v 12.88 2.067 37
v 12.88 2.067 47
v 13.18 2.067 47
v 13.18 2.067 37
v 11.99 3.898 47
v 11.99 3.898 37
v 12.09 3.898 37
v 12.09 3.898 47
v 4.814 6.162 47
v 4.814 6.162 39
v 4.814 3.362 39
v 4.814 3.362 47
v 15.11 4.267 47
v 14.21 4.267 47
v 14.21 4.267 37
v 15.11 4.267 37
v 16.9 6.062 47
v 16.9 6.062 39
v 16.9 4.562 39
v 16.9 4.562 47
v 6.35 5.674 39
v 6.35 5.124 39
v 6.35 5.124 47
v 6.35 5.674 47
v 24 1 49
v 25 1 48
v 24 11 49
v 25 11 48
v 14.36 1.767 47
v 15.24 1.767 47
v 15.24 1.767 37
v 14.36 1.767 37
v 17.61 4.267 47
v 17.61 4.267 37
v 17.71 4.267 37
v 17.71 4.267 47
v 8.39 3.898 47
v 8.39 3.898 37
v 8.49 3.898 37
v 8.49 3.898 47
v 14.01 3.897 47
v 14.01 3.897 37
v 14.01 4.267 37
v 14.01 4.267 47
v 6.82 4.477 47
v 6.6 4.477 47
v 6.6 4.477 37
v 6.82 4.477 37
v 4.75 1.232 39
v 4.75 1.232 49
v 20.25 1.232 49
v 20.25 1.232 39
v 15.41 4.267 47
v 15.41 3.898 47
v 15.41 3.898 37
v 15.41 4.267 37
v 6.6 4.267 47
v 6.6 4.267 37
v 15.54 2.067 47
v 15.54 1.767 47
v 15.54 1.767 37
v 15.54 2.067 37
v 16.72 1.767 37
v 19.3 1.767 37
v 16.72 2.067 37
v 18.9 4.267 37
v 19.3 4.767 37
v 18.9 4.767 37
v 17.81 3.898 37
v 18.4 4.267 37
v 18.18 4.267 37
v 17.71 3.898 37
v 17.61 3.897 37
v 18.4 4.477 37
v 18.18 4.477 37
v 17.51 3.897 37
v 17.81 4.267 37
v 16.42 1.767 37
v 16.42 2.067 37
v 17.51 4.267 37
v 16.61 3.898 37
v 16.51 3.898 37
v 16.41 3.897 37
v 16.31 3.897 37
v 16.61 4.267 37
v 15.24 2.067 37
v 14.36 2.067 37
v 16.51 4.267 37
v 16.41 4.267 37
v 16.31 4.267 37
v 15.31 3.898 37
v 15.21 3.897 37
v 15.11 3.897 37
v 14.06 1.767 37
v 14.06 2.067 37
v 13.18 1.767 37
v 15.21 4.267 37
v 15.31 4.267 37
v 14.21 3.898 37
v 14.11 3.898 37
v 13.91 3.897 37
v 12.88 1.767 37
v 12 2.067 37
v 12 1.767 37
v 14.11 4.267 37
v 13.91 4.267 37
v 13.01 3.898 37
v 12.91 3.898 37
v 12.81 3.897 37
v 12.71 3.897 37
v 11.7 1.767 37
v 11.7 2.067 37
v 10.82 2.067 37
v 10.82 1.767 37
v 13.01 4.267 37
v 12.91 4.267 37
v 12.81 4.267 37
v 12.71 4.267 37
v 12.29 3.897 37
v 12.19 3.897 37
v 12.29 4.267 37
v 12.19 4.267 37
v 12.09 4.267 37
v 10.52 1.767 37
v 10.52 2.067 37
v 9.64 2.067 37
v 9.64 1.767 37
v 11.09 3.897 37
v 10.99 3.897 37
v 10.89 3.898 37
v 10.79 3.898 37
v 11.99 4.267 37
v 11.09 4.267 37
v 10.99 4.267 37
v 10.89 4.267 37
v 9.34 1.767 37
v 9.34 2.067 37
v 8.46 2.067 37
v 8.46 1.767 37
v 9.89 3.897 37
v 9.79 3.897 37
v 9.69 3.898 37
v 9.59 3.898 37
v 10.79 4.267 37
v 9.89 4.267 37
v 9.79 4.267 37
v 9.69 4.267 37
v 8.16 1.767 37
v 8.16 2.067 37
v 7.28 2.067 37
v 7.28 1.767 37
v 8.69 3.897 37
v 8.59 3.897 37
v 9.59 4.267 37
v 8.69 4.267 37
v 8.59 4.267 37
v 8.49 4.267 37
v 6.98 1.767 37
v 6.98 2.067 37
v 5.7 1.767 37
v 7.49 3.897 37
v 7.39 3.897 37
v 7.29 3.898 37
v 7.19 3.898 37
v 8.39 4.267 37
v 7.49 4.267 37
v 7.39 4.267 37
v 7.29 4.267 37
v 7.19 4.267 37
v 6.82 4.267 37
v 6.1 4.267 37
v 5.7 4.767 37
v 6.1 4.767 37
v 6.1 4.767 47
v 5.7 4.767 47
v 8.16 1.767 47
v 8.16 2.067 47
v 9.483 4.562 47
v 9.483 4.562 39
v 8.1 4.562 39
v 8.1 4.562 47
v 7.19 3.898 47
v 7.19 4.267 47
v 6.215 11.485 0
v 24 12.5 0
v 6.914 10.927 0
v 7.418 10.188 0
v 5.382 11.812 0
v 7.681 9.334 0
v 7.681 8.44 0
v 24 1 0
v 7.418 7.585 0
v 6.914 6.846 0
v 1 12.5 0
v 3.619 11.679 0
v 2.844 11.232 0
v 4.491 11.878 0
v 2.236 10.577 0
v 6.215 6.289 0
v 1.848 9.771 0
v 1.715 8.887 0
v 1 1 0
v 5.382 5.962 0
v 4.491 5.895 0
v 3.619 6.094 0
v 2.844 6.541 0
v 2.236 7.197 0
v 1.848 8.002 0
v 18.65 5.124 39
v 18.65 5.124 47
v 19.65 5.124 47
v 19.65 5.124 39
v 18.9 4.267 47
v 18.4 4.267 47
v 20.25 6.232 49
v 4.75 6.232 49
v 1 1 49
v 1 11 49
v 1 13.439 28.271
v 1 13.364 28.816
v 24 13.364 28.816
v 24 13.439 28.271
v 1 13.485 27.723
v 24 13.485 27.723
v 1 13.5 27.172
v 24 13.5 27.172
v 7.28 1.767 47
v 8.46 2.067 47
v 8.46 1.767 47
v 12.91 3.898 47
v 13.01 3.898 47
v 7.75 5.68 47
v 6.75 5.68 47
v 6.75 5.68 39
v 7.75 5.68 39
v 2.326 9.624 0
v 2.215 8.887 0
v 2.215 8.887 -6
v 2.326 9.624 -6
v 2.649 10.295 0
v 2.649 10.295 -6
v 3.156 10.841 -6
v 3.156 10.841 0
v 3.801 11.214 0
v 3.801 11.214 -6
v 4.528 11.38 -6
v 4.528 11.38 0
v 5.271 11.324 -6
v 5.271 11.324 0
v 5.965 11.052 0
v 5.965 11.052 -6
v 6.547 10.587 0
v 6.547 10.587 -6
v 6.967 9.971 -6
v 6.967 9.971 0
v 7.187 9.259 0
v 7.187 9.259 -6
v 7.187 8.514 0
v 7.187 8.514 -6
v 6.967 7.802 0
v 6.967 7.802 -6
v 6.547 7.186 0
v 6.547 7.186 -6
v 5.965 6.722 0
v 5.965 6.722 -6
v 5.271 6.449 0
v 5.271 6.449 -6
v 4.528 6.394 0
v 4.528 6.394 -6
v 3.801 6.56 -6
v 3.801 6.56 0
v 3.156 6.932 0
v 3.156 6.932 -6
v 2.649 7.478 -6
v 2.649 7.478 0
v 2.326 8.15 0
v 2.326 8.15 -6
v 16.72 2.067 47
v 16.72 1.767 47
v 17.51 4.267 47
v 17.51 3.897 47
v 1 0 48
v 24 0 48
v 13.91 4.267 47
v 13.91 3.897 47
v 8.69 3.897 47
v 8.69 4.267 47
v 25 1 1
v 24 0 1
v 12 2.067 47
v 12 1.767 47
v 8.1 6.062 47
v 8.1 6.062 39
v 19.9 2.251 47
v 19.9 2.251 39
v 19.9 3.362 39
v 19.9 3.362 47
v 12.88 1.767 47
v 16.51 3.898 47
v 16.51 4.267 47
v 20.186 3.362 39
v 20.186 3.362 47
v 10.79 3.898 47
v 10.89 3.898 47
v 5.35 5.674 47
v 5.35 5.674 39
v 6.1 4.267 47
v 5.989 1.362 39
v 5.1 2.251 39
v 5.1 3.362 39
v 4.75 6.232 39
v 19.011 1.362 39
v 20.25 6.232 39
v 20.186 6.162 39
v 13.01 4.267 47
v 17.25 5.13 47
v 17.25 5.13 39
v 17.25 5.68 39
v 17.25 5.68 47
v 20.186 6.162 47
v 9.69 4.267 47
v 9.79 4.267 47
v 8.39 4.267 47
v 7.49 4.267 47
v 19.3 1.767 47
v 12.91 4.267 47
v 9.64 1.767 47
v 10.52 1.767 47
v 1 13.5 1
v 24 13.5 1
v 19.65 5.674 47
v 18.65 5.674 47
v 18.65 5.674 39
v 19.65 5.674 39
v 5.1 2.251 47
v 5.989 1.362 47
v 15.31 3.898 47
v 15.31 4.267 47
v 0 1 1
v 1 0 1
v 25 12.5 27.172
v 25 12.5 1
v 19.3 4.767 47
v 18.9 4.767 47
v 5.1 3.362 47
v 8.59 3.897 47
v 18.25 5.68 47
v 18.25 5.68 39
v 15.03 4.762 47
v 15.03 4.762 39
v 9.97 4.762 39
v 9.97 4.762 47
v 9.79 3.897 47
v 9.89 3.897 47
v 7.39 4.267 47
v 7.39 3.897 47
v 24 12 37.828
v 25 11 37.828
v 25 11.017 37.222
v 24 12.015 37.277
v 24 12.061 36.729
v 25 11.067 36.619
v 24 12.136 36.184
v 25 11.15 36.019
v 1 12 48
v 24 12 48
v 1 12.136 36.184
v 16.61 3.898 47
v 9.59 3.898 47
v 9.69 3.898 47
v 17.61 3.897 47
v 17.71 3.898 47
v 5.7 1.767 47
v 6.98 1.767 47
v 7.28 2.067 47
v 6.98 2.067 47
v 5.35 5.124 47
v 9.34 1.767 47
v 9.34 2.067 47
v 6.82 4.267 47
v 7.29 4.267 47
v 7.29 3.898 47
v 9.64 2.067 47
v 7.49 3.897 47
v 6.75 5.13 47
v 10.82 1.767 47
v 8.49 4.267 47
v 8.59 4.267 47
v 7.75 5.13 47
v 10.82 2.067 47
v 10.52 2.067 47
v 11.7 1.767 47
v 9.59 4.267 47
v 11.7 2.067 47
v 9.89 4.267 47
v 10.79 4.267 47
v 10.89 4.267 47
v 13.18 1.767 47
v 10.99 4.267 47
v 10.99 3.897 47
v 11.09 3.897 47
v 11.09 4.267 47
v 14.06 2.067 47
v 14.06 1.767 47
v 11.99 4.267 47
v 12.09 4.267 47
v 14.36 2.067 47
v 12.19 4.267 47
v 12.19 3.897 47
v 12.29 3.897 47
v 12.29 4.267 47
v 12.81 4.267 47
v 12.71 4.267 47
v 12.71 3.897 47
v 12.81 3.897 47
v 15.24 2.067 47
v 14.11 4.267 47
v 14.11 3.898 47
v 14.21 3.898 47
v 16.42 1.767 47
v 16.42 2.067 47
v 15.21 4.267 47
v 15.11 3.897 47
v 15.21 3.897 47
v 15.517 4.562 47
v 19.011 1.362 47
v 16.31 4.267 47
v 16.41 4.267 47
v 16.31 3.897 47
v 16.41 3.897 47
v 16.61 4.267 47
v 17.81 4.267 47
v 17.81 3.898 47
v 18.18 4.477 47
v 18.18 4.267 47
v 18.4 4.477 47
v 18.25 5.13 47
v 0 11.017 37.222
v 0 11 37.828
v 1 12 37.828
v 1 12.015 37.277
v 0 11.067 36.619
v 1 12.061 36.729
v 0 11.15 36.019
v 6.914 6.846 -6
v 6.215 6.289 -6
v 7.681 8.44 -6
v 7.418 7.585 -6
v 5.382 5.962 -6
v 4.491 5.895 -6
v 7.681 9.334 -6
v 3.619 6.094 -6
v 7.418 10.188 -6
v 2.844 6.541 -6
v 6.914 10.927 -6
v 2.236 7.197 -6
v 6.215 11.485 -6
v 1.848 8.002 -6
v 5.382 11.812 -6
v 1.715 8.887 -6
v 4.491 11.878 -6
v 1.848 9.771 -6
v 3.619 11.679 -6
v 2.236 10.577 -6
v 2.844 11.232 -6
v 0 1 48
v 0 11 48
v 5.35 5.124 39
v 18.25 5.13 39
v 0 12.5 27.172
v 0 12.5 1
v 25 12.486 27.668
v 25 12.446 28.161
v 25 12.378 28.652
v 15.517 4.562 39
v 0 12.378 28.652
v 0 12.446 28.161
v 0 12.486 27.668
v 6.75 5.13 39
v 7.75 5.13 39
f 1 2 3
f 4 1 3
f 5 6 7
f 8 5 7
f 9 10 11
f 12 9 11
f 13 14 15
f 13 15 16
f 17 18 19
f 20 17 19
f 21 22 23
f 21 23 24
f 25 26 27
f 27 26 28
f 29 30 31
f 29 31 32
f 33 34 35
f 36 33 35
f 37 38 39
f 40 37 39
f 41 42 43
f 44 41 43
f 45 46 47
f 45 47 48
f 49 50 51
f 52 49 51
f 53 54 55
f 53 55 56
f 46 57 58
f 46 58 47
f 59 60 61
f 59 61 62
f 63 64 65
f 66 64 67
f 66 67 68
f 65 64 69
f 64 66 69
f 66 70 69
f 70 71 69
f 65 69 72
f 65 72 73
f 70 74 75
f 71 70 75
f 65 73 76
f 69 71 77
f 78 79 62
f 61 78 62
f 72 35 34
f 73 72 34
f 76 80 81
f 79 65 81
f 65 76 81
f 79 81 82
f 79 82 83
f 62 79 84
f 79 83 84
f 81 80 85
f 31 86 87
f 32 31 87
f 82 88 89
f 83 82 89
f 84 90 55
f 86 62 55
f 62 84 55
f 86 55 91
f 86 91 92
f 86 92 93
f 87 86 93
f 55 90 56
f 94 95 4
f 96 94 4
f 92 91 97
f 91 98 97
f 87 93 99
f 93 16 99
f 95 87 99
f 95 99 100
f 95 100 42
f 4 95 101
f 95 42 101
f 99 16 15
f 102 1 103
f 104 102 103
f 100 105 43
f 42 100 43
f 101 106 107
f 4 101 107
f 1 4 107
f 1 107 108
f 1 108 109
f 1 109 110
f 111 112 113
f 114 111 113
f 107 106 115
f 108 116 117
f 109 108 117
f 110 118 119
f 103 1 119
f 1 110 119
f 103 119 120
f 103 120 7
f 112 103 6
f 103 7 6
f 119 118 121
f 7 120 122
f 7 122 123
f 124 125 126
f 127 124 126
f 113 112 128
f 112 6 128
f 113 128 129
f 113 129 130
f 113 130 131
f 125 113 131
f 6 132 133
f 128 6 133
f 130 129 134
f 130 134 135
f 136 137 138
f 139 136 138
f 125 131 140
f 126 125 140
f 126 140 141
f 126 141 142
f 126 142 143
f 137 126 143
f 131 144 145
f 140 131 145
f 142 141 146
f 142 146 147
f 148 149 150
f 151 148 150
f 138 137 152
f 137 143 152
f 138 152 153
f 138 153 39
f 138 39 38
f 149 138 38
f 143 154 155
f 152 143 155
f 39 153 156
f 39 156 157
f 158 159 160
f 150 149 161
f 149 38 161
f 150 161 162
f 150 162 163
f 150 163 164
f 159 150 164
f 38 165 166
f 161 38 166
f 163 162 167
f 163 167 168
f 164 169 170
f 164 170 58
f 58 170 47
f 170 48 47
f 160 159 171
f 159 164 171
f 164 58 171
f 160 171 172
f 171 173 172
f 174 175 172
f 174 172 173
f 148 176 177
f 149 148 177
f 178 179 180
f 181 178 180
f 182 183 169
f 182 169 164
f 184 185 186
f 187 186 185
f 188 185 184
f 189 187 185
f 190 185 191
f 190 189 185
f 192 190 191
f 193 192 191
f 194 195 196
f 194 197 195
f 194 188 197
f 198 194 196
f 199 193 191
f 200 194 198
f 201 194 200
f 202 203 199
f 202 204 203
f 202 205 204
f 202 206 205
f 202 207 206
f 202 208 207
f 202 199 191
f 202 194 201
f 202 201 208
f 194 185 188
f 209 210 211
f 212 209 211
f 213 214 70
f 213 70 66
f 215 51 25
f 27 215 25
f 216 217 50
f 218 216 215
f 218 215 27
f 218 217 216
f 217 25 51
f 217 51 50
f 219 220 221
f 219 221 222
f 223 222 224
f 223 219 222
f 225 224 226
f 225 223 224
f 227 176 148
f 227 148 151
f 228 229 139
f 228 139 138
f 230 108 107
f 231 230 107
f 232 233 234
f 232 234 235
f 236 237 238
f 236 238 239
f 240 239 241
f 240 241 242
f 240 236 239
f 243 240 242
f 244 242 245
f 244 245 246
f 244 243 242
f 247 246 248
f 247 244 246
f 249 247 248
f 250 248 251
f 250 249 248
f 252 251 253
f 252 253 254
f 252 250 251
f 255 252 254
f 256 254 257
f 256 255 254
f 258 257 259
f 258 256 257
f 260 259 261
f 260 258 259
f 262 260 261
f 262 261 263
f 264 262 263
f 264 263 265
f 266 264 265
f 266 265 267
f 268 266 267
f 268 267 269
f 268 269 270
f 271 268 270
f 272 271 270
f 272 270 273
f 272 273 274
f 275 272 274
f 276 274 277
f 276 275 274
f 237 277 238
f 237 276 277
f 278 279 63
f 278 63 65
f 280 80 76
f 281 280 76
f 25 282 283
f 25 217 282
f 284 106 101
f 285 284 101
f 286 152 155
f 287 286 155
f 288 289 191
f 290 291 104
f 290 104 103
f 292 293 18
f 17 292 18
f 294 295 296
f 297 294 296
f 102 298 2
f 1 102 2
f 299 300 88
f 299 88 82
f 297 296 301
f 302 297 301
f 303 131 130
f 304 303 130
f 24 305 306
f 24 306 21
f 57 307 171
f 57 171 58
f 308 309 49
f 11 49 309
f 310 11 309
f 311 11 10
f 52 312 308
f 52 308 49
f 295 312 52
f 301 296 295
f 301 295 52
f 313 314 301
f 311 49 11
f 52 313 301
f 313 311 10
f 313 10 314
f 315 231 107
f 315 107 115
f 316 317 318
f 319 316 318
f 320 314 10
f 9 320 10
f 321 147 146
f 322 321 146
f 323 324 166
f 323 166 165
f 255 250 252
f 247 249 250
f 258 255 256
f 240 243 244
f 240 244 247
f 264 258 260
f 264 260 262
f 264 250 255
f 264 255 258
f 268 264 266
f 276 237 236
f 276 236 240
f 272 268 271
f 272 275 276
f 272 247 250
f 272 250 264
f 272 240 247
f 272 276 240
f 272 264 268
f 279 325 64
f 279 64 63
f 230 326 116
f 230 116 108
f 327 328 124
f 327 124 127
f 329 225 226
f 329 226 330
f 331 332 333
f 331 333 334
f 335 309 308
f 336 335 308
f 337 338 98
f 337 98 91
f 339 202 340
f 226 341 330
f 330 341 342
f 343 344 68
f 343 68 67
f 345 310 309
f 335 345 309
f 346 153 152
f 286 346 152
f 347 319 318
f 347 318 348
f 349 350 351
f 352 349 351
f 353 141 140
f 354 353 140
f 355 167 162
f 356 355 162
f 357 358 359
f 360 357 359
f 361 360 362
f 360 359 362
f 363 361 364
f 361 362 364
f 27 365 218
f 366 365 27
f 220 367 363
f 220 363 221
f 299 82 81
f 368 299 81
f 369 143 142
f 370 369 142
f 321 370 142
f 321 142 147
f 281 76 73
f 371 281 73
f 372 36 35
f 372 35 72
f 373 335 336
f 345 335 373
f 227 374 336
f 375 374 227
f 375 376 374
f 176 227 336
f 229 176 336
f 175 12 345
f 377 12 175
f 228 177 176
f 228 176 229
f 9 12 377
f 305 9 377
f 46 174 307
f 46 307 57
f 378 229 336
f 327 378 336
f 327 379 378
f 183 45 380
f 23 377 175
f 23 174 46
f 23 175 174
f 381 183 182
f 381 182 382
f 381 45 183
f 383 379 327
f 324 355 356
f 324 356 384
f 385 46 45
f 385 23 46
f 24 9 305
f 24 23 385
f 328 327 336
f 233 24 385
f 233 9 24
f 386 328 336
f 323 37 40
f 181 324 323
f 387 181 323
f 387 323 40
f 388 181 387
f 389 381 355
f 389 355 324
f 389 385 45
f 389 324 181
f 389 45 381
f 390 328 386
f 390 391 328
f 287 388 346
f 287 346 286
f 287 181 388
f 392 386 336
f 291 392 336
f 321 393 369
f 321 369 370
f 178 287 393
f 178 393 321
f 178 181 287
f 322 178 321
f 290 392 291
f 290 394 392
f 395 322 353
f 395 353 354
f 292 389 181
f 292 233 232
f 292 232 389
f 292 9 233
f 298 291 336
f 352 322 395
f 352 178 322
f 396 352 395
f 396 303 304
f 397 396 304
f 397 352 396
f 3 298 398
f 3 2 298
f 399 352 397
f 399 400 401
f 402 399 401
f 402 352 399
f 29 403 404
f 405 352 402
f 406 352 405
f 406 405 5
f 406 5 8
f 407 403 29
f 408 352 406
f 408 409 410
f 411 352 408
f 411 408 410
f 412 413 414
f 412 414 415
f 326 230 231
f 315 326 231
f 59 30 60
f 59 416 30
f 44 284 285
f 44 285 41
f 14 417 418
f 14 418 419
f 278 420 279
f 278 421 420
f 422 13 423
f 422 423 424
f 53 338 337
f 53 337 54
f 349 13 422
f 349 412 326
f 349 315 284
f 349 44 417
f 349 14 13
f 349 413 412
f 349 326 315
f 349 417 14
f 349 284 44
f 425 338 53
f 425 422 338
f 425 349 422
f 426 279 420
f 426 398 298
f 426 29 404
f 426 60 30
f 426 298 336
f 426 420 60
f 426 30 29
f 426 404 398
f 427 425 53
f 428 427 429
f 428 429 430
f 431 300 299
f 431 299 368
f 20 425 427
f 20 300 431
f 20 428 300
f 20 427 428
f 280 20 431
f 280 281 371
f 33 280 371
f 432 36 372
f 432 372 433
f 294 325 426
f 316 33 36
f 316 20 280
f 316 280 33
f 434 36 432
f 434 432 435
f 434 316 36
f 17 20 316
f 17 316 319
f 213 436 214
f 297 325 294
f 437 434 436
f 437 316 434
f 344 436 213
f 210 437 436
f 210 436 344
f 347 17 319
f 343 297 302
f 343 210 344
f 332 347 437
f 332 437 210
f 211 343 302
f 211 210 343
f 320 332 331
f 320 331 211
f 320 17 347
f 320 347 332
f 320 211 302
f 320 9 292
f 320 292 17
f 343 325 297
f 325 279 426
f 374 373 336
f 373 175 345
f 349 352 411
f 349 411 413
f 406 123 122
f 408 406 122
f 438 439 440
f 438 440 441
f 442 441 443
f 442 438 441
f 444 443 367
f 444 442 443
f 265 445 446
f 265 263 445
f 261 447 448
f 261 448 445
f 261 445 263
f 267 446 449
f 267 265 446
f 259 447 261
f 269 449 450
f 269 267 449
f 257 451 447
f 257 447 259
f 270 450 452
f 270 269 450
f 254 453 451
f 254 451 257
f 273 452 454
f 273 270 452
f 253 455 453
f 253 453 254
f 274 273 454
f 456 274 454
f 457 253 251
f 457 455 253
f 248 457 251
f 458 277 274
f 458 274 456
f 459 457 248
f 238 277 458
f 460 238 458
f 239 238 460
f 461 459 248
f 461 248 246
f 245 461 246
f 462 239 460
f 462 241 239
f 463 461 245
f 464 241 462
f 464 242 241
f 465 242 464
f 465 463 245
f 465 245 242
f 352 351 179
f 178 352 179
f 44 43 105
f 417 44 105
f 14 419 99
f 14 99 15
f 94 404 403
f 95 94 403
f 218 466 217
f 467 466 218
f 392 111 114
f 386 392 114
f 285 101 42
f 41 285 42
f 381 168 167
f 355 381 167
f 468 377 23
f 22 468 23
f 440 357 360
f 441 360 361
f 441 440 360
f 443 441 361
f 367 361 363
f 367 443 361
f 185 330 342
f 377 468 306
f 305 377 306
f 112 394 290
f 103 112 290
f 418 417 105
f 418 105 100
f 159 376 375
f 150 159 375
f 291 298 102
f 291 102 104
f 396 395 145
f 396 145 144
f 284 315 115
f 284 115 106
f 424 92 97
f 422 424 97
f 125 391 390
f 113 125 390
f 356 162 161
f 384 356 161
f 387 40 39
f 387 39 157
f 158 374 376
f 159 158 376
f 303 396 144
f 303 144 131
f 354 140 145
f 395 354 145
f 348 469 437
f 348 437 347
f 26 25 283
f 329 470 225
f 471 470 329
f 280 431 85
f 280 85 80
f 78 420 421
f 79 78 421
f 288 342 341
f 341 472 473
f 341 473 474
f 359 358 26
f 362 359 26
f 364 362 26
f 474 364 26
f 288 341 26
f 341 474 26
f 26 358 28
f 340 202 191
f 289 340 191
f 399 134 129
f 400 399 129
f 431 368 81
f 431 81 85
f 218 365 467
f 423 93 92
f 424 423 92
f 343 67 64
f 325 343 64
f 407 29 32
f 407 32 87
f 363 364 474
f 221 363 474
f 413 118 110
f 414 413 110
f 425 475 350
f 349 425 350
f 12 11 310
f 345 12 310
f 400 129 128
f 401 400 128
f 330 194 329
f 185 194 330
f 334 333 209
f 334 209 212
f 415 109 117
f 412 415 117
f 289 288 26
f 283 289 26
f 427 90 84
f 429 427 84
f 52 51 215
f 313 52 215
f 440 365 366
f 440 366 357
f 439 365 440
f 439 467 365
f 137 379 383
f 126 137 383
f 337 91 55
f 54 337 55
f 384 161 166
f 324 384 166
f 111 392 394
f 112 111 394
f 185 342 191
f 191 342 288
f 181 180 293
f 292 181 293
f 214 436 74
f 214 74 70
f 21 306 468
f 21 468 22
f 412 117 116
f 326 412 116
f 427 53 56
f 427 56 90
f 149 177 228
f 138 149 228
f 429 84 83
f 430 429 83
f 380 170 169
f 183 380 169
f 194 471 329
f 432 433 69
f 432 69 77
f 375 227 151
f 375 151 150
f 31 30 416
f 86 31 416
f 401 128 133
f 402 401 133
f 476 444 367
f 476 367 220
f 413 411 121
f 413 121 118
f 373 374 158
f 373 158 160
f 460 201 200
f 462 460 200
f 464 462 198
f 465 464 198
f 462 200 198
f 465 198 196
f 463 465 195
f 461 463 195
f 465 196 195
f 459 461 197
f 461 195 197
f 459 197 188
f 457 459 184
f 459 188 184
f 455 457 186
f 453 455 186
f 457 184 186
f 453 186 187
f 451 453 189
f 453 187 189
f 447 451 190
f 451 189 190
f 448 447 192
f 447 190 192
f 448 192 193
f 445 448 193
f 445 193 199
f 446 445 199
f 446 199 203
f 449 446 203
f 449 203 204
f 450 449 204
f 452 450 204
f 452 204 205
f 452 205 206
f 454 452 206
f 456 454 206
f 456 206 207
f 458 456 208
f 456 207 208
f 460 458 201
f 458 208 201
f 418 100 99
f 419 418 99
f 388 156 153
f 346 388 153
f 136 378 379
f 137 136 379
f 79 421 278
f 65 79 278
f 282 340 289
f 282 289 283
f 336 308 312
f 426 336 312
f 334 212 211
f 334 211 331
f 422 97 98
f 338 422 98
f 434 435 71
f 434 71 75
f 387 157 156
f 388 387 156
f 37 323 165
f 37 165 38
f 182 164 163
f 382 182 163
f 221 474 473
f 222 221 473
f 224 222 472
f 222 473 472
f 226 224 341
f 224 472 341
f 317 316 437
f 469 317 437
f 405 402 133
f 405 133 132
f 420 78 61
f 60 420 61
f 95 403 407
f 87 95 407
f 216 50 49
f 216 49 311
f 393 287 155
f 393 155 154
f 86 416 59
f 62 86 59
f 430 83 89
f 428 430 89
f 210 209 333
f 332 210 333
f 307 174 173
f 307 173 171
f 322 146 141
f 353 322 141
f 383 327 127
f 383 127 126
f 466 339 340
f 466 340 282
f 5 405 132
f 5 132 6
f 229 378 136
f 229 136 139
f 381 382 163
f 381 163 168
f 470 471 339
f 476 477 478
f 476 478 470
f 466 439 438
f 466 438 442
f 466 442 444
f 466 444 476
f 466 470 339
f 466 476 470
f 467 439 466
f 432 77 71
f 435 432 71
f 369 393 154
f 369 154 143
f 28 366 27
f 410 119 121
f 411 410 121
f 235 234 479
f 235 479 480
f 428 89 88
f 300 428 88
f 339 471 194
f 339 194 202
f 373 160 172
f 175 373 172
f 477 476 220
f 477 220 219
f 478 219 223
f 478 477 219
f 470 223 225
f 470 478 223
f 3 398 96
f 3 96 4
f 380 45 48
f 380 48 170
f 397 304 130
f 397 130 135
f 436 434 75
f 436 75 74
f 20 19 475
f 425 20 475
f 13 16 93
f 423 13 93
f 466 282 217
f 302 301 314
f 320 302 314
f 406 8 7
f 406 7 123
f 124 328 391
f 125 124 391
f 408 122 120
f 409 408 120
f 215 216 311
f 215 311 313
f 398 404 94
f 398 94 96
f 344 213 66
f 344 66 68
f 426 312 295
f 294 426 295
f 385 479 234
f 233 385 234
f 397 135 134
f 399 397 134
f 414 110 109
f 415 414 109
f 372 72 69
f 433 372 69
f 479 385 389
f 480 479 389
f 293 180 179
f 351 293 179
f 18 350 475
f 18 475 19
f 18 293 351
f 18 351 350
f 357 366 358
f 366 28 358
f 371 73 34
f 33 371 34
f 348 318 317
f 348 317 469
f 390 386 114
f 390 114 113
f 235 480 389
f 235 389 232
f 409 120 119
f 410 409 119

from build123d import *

# Parameters (mm, degrees)
BOSS_EXTRUDE1_DEPTH = 25
CHAMFER1_SIZE       = 1
SKETCH4_W           = 15.5
SKETCH4_H           = 5
CUT_EXTRUDE1_DEPTH  = 10
SKETCH5_W           = 1
SKETCH5_H           = 0.55
BOSS_EXTRUDE2_DEPTH = 8
CUT_EXTRUDE2_DEPTH  = 10
SKETCH7_W           = 0.3
SKETCH7_H           = 0.3
BOSS_EXTRUDE3_DEPTH = 10
SKETCH8_R           = 3
SKETCH8_R_2         = 2.5
BOSS_EXTRUDE4_DEPTH = 6


with BuildPart() as part:
    # Sketch3 → Boss-Extrude1 (new body)
    with BuildSketch(Plane(origin=(0, 0, 0), x_dir=(0, 0, -1), z_dir=(1, 0, 0))):
        with BuildLine():
            Line((0, 0), (-49, 0))
            Line((-49, 0), (-49, 12))
            Line((-49, 12), (-37.827625303, 12))
            ThreePointArc((-37.827625303, 12), (-37.002819988, 12.03407324), (-36.18363543, 12.136060762))
            Line((-36.18363543, 12.136060762), (-28.81636457, 13.363939238))
            ThreePointArc((-28.81636457, 13.363939238), (-27.997180012, 13.46592676), (-27.172374697, 13.5))
            Line((-27.172374697, 13.5), (0, 13.5))
            Line((0, 13.5), (0, 0))
        make_face()
    extrude(amount=BOSS_EXTRUDE1_DEPTH)

    # Chamfer1
    chamfer1_edges = [part.edges().sort_by_distance(p)[0] for p in [
        (0, 12.75, 32.5),
        (0, 13.46592676, 27.997180012),
        (0, 13.5, 13.586187349),
        (0, 6.75, 0),
        (25, 13.46592676, 27.997180012),
        (12.5, 0, 0),
        (12.5, 0, 49),
        (12.5, 12, 49),
        (12.5, 13.5, 0),
        (25, 12.75, 32.5),
        (25, 12.03407324, 37.002819988),
        (25, 12, 43.413812651),
        (25, 6, 49),
        (25, 0, 24.5),
        (25, 6.75, 0),
        (0, 0, 24.5),
        (25, 13.5, 13.586187349),
        (0, 6, 49),
        (0, 12, 43.413812651),
        (0, 12.03407324, 37.002819988),
    ]]
    chamfer(chamfer1_edges, length=CHAMFER1_SIZE)

    # Sketch4 → Cut-Extrude1 (cut)
    with BuildSketch(Plane.XY.offset(49)):
        with Locations((12.5, 3.731572294)):
            Rectangle(SKETCH4_W, SKETCH4_H)
    extrude(amount=-CUT_EXTRUDE1_DEPTH, mode=Mode.SUBTRACT)

    # Sketch5 → Boss-Extrude2 (add)
    with BuildSketch(Plane.XY.offset(39)):
        Polygon((20.186366737, 6.162059048), (4.813633263, 6.162059048), (4.813633263, 3.362059048), (5.1, 3.362059048), (5.1, 2.250733439), (5.988674392, 1.362059048), (19.011325608, 1.362059048), (19.9, 2.250733439), (19.9, 3.362059048), (20.186366737, 3.362059048), align=None)
        Polygon((8.1, 6.062059048), (16.9, 6.062059048), (16.9, 4.562059048), (15.516884386, 4.562059048), (15.030478648, 4.762059048), (9.969521352, 4.762059048), (9.483115614, 4.562059048), (8.1, 4.562059048), align=None, mode=Mode.SUBTRACT)
        with Locations((17.75, 5.405243542)):
            Rectangle(SKETCH5_W, SKETCH5_H, mode=Mode.SUBTRACT)
        with Locations((19.15, 5.399458355)):
            Rectangle(SKETCH5_W, SKETCH5_H, mode=Mode.SUBTRACT)
        with Locations((5.85, 5.399458355)):
            Rectangle(SKETCH5_W, SKETCH5_H, mode=Mode.SUBTRACT)
        with Locations((7.25, 5.405243542)):
            Rectangle(SKETCH5_W, SKETCH5_H, mode=Mode.SUBTRACT)
    extrude(amount=BOSS_EXTRUDE2_DEPTH)

    # Sketch6 → Cut-Extrude2 (cut)
    with BuildSketch(Plane.XY.offset(47)):
        Polygon((12.29, 4.267126877), (12.71, 4.267126877), (12.71, 3.897126877), (12.81, 3.897126877), (12.81, 4.267126877), (12.91, 4.267126877), (12.91, 3.897644042), (13.01, 3.897644042), (13.01, 4.267126877), (13.91, 4.267126877), (13.91, 3.897126877), (14.01, 3.897126877), (14.01, 4.267126877), (14.11, 4.267126877), (14.11, 3.897644042), (14.21, 3.897644042), (14.21, 4.267126877), (15.11, 4.267126877), (15.11, 3.897126877), (15.21, 3.897126877), (15.21, 4.267126877), (15.31, 4.267126877), (15.31, 3.897644042), (15.41, 3.897644042), (15.41, 4.267126877), (16.31, 4.267126877), (16.31, 3.897126877), (16.41, 3.897126877), (16.41, 4.267126877), (16.51, 4.267126877), (16.51, 3.897644042), (16.61, 3.897644042), (16.61, 4.267126877), (17.51, 4.267126877), (17.51, 3.897126877), (17.61, 3.897126877), (17.61, 4.267126877), (17.71, 4.267126877), (17.71, 3.897644042), (17.81, 3.897644042), (17.81, 4.267126877), (18.18, 4.267126877), (18.18, 4.477126877), (18.4, 4.477126877), (18.4, 4.267126877), (18.9, 4.267126877), (18.9, 4.767126877), (19.3, 4.767126877), (19.3, 1.767126877), (5.7, 1.767126877), (5.7, 4.767126877), (6.1, 4.767126877), (6.1, 4.267126877), (6.6, 4.267126877), (6.6, 4.477126877), (6.82, 4.477126877), (6.82, 4.267126877), (7.19, 4.267126877), (7.19, 3.897644042), (7.29, 3.897644042), (7.29, 4.267126877), (7.39, 4.267126877), (7.39, 3.897126877), (7.49, 3.897126877), (7.49, 4.267126877), (8.39, 4.267126877), (8.39, 3.897644042), (8.49, 3.897644042), (8.49, 4.267126877), (8.59, 4.267126877), (8.59, 3.897126877), (8.69, 3.897126877), (8.69, 4.267126877), (9.59, 4.267126877), (9.59, 3.897644042), (9.69, 3.897644042), (9.69, 4.267126877), (9.79, 4.267126877), (9.79, 3.897126877), (9.89, 3.897126877), (9.89, 4.267126877), (10.79, 4.267126877), (10.79, 3.897644042), (10.89, 3.897644042), (10.89, 4.267126877), (10.99, 4.267126877), (10.99, 3.897126877), (11.09, 3.897126877), (11.09, 4.267126877), (11.99, 4.267126877), (11.99, 3.897644042), (12.09, 3.897644042), (12.09, 4.267126877), (12.19, 4.267126877), (12.19, 3.897126877), (12.29, 3.897126877), align=None)
    extrude(amount=-CUT_EXTRUDE2_DEPTH, mode=Mode.SUBTRACT)

    # Sketch7 → Boss-Extrude3 (add)
    with BuildSketch(Plane.XY.offset(47)):
        with Locations((7.13, 1.917126877)):
            Rectangle(SKETCH7_W, SKETCH7_H)
        with Locations((8.31, 1.917126877)):
            Rectangle(SKETCH7_W, SKETCH7_H)
        with Locations((9.49, 1.917126877)):
            Rectangle(SKETCH7_W, SKETCH7_H)
        with Locations((10.67, 1.917126877)):
            Rectangle(SKETCH7_W, SKETCH7_H)
        with Locations((11.85, 1.917126877)):
            Rectangle(SKETCH7_W, SKETCH7_H)
        with Locations((13.03, 1.917126877)):
            Rectangle(SKETCH7_W, SKETCH7_H)
        with Locations((14.21, 1.917126877)):
            Rectangle(SKETCH7_W, SKETCH7_H)
        with Locations((15.39, 1.917126877)):
            Rectangle(SKETCH7_W, SKETCH7_H)
        with Locations((16.57, 1.917126877)):
            Rectangle(SKETCH7_W, SKETCH7_H)
    extrude(amount=-BOSS_EXTRUDE3_DEPTH)

    # Sketch8 → Boss-Extrude4 (add)
    with BuildSketch(Plane(origin=(0, 0, 0), x_dir=(-1, 0, 0), z_dir=(0, 0, -1))):
        with Locations((-4.714743405, 8.886764937)):
            Circle(SKETCH8_R)
        with Locations((-4.714743405, 8.886764937)):
            Circle(SKETCH8_R_2, mode=Mode.SUBTRACT)
    extrude(amount=BOSS_EXTRUDE4_DEPTH)


solid = part.part
